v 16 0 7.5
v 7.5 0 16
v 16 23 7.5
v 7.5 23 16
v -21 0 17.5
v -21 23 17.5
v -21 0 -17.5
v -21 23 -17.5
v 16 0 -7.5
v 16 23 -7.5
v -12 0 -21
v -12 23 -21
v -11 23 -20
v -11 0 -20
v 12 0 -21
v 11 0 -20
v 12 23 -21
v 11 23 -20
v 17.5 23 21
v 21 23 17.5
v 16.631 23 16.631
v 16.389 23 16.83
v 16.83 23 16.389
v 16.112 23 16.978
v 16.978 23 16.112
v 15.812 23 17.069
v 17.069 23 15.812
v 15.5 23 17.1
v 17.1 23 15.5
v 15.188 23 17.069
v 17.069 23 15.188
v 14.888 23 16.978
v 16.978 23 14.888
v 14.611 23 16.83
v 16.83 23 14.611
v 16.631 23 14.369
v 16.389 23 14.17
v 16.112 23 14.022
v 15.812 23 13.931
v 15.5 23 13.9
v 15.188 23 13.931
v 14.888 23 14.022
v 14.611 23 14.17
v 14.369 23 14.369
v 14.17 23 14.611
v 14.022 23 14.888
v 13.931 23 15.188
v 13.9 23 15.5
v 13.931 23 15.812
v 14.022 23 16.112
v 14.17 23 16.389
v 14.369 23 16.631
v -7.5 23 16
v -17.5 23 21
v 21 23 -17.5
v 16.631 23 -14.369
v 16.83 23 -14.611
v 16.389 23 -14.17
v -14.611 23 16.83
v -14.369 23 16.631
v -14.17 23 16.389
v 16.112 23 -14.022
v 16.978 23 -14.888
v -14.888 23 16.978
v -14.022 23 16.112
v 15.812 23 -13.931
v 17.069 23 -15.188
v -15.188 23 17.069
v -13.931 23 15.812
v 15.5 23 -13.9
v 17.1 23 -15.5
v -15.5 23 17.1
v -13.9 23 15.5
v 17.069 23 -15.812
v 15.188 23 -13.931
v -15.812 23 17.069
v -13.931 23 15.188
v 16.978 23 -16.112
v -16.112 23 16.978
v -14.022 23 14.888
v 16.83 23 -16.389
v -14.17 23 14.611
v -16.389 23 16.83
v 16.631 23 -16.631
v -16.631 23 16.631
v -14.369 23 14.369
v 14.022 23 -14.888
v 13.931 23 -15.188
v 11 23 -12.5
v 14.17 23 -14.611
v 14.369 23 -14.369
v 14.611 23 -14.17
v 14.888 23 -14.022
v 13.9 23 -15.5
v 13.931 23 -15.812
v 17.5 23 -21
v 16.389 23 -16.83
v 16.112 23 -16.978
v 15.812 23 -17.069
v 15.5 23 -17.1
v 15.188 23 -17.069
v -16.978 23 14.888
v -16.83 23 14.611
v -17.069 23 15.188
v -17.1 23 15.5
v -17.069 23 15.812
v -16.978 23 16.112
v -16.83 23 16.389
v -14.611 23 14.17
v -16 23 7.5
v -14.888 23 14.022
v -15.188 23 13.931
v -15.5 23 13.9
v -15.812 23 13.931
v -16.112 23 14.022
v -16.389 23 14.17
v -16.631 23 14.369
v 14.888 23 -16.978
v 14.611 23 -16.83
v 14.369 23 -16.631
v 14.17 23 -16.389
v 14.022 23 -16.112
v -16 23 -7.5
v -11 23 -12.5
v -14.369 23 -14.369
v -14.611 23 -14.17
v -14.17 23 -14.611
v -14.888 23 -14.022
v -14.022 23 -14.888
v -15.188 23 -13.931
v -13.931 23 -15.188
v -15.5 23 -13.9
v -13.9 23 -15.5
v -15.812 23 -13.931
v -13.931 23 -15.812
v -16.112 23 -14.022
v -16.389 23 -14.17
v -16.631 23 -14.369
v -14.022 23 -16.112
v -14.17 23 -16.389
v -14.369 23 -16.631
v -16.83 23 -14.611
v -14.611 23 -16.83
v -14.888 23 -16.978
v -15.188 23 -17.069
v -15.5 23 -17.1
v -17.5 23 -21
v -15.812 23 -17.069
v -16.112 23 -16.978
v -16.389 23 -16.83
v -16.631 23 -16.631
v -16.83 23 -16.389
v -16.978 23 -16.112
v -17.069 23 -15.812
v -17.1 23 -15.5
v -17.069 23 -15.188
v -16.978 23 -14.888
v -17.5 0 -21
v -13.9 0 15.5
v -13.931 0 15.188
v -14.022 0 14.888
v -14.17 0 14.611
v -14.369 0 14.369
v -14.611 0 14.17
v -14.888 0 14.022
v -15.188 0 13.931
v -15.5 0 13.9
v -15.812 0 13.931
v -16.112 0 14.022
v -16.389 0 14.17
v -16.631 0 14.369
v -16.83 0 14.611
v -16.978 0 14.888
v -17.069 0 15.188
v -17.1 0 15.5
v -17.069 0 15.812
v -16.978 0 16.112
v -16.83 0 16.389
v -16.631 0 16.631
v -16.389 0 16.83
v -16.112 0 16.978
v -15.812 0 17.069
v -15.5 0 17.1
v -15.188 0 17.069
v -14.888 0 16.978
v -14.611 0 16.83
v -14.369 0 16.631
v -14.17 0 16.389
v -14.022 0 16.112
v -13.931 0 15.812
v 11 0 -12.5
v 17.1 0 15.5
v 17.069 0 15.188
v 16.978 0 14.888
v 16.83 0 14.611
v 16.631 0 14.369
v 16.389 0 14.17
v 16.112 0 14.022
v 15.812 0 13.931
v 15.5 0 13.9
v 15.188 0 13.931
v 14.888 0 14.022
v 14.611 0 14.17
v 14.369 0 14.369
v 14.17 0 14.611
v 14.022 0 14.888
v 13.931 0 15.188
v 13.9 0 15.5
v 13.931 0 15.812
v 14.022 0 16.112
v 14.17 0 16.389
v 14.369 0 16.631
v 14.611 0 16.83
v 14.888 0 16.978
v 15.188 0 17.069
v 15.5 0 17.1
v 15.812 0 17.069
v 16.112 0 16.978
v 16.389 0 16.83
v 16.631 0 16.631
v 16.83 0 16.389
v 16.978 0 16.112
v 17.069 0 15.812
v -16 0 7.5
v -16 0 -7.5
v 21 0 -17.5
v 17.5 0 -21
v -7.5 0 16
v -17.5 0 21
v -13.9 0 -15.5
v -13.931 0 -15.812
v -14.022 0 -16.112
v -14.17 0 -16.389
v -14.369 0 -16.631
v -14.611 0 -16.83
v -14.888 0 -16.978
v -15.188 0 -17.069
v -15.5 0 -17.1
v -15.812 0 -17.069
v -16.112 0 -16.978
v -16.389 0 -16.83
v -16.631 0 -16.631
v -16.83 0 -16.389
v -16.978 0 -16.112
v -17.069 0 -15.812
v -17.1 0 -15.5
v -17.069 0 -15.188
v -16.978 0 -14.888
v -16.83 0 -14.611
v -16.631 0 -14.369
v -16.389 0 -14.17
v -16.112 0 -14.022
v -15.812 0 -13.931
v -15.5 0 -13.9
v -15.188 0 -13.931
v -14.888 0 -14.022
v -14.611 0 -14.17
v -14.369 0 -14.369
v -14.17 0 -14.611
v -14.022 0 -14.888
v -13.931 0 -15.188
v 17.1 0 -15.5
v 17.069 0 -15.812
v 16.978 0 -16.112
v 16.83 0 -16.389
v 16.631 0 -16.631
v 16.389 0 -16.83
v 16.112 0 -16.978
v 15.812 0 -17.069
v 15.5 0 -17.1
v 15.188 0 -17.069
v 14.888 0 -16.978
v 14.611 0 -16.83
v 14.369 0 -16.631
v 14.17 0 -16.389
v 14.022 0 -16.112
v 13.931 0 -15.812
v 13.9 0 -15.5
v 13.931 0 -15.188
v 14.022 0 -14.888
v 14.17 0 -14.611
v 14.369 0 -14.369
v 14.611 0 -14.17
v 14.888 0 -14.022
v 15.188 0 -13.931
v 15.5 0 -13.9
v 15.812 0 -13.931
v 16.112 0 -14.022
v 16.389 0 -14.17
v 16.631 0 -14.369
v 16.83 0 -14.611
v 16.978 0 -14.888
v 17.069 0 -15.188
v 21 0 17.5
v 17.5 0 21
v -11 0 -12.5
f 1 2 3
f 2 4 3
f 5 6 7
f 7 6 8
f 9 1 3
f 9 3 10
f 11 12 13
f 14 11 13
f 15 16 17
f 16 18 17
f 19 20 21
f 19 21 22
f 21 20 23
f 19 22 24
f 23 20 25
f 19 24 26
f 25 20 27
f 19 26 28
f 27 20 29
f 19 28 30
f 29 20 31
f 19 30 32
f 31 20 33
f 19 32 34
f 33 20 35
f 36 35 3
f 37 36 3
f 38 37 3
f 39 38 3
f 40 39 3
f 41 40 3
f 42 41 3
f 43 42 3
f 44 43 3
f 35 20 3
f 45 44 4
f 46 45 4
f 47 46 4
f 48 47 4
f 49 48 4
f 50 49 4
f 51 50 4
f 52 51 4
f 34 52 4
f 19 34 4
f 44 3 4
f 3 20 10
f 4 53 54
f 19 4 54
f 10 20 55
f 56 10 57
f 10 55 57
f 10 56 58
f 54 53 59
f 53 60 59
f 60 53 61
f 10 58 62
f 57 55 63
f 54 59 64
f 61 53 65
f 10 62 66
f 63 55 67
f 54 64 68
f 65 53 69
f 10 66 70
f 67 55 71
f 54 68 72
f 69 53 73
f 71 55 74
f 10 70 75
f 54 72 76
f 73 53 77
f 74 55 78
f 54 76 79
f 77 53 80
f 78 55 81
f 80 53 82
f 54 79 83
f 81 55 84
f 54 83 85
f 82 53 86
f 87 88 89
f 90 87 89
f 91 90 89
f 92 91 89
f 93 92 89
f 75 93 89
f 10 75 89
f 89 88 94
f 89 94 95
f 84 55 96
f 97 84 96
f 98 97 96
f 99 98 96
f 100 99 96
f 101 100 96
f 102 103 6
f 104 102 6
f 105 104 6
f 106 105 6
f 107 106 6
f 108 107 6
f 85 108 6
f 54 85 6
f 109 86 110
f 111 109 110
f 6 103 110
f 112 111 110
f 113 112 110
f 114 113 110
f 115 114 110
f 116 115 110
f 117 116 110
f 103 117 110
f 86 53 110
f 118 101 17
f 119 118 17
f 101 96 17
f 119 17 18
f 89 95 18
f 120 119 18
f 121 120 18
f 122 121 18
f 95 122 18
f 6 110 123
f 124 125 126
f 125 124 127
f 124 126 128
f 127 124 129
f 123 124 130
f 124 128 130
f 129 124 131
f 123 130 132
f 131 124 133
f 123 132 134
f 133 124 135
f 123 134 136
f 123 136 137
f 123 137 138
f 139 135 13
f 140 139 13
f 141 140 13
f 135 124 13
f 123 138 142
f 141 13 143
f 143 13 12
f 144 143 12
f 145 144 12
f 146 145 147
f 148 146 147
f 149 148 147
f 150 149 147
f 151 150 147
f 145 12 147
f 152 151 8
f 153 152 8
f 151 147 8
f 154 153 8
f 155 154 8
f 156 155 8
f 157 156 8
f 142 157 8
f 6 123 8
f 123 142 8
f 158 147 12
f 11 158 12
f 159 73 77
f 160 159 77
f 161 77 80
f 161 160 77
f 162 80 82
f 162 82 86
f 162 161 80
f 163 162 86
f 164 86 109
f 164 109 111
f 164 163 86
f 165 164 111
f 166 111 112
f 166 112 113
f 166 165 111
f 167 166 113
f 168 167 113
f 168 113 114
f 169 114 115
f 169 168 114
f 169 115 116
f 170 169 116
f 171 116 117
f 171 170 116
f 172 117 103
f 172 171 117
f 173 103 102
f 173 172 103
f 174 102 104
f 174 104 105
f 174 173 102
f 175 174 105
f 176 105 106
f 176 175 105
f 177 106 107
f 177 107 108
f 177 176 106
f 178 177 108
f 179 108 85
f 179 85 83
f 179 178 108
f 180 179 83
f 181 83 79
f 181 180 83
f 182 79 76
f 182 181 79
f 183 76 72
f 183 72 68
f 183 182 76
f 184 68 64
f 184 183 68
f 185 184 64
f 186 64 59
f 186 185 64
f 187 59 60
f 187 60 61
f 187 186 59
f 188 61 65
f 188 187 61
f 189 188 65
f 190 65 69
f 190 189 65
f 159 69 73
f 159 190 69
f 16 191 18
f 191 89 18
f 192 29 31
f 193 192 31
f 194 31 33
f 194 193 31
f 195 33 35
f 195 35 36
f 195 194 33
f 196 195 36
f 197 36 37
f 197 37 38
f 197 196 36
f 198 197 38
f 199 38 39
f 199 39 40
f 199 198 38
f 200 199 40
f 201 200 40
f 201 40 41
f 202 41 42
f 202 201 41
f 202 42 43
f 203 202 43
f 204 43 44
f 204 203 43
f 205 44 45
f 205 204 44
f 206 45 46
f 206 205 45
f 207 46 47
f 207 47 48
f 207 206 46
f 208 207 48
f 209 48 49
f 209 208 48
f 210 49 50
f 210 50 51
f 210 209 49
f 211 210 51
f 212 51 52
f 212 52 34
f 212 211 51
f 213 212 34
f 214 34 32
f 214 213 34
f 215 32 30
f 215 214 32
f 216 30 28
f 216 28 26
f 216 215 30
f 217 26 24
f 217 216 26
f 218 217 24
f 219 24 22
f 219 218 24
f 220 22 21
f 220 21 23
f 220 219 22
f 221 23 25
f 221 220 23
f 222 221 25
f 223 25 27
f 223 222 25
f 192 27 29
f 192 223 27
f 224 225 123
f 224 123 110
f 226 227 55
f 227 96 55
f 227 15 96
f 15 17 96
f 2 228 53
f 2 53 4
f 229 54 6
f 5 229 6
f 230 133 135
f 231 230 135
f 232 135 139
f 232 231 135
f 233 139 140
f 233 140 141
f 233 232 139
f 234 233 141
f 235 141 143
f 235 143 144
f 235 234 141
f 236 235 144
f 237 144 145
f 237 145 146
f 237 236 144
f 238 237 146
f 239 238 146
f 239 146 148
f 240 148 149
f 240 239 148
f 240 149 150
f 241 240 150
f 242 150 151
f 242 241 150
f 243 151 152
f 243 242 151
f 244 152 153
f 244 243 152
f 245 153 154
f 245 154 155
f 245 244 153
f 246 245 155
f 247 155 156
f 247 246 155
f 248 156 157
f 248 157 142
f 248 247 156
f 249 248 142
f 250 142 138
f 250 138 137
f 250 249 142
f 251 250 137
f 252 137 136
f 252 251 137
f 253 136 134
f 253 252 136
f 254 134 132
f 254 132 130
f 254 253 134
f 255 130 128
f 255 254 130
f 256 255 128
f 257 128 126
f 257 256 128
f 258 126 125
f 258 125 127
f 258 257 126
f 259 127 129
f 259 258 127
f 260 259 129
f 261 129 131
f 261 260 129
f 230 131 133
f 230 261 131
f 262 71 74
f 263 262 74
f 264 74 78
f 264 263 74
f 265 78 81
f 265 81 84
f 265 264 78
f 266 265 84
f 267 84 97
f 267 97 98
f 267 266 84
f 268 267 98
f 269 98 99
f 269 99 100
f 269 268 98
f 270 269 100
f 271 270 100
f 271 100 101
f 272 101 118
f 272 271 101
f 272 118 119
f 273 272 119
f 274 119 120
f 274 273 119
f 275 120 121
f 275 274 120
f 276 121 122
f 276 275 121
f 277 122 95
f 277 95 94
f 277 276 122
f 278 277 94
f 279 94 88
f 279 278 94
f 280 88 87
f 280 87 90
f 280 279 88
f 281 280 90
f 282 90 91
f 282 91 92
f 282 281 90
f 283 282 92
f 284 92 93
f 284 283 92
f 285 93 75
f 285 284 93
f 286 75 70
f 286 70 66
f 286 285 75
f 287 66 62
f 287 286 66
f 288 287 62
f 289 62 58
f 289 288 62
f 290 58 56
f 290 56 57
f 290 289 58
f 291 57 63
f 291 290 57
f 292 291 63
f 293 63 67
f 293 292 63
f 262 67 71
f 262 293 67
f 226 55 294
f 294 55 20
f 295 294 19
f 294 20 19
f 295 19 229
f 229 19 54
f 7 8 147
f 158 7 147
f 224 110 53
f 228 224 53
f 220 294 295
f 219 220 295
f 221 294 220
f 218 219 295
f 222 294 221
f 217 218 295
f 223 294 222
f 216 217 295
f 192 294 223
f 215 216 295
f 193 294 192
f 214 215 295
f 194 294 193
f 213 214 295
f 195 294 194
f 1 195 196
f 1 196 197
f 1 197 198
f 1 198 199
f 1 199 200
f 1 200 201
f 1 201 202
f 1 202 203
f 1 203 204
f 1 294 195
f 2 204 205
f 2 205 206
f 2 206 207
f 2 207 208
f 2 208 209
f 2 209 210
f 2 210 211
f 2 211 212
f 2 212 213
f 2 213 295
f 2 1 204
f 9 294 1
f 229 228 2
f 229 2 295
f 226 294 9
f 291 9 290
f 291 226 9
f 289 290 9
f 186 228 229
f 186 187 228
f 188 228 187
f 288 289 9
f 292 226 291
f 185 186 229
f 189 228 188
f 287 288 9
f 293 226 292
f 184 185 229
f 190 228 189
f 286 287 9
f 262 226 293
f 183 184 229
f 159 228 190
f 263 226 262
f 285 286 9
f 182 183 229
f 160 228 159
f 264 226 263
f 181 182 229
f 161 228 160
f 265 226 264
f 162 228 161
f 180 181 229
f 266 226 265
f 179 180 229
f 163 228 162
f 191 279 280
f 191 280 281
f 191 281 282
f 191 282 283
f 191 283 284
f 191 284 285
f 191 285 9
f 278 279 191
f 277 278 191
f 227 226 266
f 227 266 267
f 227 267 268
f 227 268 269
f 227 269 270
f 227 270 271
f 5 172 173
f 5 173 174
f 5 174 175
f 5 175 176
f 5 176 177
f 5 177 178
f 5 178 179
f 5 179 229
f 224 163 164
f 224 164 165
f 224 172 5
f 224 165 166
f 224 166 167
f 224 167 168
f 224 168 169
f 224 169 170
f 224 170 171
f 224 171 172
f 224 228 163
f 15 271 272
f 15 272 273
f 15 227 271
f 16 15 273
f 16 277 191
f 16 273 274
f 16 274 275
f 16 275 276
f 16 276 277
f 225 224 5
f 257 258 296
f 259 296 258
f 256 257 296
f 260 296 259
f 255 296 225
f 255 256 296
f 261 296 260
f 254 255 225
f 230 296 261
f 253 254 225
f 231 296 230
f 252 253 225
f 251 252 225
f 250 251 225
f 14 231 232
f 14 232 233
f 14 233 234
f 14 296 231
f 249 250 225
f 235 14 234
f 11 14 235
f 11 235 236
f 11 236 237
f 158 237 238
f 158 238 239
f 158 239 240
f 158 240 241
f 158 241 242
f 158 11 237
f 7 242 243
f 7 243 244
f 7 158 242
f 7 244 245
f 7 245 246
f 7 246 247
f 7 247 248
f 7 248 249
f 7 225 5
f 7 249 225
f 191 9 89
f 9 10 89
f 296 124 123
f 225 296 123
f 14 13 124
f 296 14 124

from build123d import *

# Parameters (mm, degrees)
SKETCH1_R       = 1.6
BASE_DEPTH      = 23
BASE_DEPTH_BACK = 0.0001


with BuildPart() as part:
    # Sketch1 → Base (new body, two sides)
    with BuildSketch(Plane(origin=(0, 0, 0), x_dir=(1, 0, 0), z_dir=(0, 1, 0))) as base_sk:
        Polygon((-16, -7.499999998), (-7.5, -15.999999998), (7.5, -15.999999998), (16, -7.499999998), (16, 7.500000002), (11, 12.500000002), (11, 20.000000005), (12, 21.000000005), (17.500000004, 21.000000005), (21, 17.500000009), (21, -17.499999998), (17.5, -20.999999998), (-17.5, -20.999999998), (-21, -17.499999998), (-21, 17.500000009), (-17.500000004, 21.000000005), (-12, 21.000000005), (-11, 20.000000005), (-11, 12.500000002), (-16, 7.500000002), align=None)
        with Locations((-15.500000002, 15.5)):
            Circle(SKETCH1_R, mode=Mode.SUBTRACT)
        with Locations((-15.500000002, -15.5)):
            Circle(SKETCH1_R, mode=Mode.SUBTRACT)
        with Locations((15.500000002, -15.5)):
            Circle(SKETCH1_R, mode=Mode.SUBTRACT)
        with Locations((15.500000002, 15.5)):
            Circle(SKETCH1_R, mode=Mode.SUBTRACT)
    extrude(amount=BASE_DEPTH)
    extrude(base_sk.sketch, amount=-BASE_DEPTH_BACK)


solid = part.part
